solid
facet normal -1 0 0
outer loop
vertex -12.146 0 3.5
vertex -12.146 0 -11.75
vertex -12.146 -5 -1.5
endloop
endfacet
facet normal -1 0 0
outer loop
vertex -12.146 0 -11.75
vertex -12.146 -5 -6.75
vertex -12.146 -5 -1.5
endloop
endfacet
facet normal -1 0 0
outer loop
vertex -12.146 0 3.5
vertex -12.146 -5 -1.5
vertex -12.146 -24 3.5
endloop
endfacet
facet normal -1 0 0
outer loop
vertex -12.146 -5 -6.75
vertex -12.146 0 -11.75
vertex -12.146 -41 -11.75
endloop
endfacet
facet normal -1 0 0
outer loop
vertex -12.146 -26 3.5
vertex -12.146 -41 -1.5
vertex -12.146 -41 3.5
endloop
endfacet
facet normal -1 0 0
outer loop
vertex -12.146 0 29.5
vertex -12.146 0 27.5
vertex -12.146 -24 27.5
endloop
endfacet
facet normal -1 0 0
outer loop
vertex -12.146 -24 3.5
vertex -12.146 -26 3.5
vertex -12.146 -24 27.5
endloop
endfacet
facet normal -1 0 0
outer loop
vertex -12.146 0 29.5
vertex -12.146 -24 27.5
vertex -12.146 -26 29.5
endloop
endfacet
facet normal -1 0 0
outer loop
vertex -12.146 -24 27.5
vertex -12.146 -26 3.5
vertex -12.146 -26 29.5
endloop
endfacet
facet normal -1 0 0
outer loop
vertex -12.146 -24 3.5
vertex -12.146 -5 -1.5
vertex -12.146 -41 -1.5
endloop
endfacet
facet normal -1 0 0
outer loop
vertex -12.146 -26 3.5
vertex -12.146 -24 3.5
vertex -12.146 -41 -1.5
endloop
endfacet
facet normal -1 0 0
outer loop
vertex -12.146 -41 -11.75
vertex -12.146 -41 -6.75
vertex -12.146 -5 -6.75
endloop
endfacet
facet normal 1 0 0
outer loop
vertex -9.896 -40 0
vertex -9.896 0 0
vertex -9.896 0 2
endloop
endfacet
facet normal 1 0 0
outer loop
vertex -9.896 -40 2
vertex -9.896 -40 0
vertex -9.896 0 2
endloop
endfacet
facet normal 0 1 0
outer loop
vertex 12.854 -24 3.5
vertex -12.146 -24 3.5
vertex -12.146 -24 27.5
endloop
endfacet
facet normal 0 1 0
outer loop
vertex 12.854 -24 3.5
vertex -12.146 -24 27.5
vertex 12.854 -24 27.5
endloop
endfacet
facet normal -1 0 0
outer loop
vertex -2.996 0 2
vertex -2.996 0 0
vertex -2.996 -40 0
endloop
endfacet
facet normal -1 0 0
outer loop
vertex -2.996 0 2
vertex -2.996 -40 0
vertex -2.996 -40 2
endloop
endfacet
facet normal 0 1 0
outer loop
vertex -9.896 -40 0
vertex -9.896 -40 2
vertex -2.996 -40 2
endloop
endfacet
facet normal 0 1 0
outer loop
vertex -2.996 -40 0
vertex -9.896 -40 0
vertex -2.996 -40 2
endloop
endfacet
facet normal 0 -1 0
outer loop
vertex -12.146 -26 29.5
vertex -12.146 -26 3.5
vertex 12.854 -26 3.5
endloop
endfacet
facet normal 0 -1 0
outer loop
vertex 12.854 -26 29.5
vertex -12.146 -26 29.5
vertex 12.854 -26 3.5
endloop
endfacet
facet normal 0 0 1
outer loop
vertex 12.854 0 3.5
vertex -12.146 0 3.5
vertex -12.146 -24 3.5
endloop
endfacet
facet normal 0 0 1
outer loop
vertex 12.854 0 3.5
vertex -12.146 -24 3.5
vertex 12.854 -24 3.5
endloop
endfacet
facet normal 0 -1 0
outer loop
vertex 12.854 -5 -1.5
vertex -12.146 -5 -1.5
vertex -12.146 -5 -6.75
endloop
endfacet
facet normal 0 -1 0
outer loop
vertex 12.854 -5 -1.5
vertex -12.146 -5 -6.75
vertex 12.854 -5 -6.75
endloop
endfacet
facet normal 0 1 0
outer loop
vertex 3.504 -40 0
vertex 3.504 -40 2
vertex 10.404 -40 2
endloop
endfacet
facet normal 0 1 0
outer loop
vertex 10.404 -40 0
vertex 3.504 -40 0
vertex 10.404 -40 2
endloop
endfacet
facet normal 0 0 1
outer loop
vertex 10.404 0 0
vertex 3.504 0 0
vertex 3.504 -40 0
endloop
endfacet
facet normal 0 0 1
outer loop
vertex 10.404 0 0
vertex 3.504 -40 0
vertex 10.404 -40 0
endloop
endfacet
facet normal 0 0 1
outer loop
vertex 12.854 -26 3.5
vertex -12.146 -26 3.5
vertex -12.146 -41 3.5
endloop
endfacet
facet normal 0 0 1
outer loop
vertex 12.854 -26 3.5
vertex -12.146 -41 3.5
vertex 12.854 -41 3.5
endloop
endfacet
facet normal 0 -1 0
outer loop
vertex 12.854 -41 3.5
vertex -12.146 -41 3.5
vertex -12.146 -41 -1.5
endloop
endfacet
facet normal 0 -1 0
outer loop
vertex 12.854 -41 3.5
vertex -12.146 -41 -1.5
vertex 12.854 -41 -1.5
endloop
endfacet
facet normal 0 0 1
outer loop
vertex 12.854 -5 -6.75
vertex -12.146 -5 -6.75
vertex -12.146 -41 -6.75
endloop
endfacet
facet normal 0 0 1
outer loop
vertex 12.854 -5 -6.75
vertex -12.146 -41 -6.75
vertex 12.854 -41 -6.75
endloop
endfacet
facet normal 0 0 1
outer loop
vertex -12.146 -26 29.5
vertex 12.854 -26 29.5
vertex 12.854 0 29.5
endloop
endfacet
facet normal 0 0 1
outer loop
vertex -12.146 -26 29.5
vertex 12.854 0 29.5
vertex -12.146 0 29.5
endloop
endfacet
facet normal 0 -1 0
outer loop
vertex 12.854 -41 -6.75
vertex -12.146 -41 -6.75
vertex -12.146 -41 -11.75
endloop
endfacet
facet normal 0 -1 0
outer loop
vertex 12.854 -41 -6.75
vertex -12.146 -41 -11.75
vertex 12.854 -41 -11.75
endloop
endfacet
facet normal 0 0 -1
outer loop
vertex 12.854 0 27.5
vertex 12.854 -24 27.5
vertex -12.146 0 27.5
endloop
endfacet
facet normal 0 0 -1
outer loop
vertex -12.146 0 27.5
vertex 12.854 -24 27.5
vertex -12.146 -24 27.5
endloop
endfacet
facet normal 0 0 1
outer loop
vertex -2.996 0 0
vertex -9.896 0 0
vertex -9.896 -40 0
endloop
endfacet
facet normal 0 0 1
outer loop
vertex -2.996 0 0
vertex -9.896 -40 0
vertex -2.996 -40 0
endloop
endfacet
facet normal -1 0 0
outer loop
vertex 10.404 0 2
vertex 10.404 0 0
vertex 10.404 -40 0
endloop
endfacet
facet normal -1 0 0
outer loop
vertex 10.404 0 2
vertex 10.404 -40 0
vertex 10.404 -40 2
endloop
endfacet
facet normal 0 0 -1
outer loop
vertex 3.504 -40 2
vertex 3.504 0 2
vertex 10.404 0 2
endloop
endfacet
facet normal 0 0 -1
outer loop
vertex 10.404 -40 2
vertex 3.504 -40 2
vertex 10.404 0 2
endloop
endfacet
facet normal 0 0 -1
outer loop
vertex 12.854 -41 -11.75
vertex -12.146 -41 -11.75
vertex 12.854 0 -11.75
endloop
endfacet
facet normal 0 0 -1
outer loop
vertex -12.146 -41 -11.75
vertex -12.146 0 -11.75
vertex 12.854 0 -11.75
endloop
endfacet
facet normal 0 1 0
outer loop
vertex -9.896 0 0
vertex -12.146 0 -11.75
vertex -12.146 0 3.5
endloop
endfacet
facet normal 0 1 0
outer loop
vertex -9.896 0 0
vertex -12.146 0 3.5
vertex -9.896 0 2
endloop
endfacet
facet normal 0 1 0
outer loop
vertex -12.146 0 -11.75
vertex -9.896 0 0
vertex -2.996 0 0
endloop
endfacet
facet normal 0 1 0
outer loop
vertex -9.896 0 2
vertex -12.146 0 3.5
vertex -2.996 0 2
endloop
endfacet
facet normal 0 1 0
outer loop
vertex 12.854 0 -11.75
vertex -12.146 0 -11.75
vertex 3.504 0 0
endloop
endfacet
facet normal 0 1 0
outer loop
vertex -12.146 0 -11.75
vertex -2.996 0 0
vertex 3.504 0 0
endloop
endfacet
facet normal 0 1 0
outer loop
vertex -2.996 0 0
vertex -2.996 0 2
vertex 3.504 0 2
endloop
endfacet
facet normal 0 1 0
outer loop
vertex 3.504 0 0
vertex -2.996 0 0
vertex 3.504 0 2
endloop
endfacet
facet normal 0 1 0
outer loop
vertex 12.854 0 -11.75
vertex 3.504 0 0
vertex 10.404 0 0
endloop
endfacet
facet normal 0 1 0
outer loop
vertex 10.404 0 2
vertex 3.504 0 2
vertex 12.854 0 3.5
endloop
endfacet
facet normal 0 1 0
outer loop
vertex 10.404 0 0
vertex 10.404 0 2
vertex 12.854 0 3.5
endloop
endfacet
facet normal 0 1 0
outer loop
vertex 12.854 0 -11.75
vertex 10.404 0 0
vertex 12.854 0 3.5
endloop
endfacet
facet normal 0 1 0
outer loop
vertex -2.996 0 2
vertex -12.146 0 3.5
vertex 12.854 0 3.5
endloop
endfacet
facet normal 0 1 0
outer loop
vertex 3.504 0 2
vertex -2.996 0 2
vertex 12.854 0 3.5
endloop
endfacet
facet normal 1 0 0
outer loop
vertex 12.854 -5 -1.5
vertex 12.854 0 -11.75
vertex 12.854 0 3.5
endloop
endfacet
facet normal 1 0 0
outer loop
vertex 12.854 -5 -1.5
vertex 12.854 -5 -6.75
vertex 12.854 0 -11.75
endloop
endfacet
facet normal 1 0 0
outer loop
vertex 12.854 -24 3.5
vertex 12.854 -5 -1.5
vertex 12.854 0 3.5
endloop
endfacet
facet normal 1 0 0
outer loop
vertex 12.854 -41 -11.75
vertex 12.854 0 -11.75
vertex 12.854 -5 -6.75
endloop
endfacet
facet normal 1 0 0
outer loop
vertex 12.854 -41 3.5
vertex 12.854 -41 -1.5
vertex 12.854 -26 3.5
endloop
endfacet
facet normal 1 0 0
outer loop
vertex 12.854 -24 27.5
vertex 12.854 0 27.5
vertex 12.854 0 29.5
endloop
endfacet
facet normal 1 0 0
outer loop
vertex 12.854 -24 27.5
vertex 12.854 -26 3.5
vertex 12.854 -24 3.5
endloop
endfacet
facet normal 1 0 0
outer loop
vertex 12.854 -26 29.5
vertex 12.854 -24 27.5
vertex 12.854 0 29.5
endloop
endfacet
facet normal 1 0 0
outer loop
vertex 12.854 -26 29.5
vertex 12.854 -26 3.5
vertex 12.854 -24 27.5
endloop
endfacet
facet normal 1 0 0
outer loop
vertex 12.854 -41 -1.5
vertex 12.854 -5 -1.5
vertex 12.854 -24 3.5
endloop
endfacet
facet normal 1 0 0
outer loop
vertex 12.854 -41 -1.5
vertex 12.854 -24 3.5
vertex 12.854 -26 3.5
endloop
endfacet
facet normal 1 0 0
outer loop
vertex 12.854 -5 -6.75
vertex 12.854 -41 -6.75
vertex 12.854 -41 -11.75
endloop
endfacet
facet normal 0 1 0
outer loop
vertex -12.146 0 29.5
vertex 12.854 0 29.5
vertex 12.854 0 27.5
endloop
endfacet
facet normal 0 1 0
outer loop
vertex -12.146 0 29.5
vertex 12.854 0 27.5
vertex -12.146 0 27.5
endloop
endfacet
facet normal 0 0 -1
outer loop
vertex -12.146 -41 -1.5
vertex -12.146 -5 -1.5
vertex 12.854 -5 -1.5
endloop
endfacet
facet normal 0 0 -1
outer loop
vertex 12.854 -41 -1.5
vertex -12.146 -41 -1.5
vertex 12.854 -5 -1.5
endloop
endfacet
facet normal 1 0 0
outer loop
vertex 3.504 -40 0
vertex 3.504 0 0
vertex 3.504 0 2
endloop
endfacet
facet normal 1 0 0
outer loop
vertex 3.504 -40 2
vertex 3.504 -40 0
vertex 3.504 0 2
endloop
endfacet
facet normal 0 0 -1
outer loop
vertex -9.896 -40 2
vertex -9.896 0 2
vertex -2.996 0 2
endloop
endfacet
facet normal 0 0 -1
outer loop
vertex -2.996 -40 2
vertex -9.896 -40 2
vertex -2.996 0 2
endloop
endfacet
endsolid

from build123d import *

# Parameters (mm, degrees)
F0_W      = 25
F0_H      = 5
F0_W_2    = 6.9
F0_H_2    = 2
F1_DEPTH  = 40
F2_W      = 25
F2_H      = 5
F3_DEPTH  = 1
F4_W      = 25
F4_H      = 5
F5_DEPTH  = 10.25
F6_W      = 25
F6_H      = 5
F7_DEPTH  = 36
F8_W      = 25
F8_H      = 2
F9_DEPTH  = 26
F10_W     = 25
F10_H     = 2
F11_DEPTH = 24


with BuildPart() as f1:
    # F0 (on Front) → F1 (new body)
    with BuildSketch(Plane.XZ):
        with Locations((0.35389, 1)):
            Rectangle(F0_W, F0_H)
        with Locations((-6.44611, 1)):
            Rectangle(F0_W_2, F0_H_2, mode=Mode.SUBTRACT)
        with Locations((6.95389, 1)):
            Rectangle(F0_W_2, F0_H_2, mode=Mode.SUBTRACT)
    extrude(amount=F1_DEPTH)

    # F2 (on face) → F3 (join)
    with BuildSketch(Plane.XZ.offset(40)):
        with Locations((0.35389, 1)):
            Rectangle(F2_W, F2_H)
    extrude(amount=F3_DEPTH)

    # F4 (on face) → F5 (join)
    with BuildSketch(Plane(origin=(0, 0, -1.5), x_dir=(1, 0, 0), z_dir=(0, 0, -1))):
        with Locations((0.35389, 2.5)):
            Rectangle(F4_W, F4_H)
    extrude(amount=F5_DEPTH)

    # F6 (on face) → F7 (join)
    with BuildSketch(Plane.XZ.offset(5)):
        with Locations((0.35389, -9.25)):
            Rectangle(F6_W, F6_H)
    extrude(amount=F7_DEPTH)

    # F8 (on face) → F9 (join)
    with BuildSketch(Plane.XY.offset(3.5)):
        with Locations((0.35389, -25)):
            Rectangle(F8_W, F8_H)
    extrude(amount=F9_DEPTH)

    # F10 (on face) → F11 (join)
    with BuildSketch(Plane(origin=(0, -24, 0), x_dir=(-1, 0, 0), z_dir=(0, 1, 0))):
        with Locations((-0.35389, 28.5)):
            Rectangle(F10_W, F10_H)
    extrude(amount=F11_DEPTH)


solid = f1.part
